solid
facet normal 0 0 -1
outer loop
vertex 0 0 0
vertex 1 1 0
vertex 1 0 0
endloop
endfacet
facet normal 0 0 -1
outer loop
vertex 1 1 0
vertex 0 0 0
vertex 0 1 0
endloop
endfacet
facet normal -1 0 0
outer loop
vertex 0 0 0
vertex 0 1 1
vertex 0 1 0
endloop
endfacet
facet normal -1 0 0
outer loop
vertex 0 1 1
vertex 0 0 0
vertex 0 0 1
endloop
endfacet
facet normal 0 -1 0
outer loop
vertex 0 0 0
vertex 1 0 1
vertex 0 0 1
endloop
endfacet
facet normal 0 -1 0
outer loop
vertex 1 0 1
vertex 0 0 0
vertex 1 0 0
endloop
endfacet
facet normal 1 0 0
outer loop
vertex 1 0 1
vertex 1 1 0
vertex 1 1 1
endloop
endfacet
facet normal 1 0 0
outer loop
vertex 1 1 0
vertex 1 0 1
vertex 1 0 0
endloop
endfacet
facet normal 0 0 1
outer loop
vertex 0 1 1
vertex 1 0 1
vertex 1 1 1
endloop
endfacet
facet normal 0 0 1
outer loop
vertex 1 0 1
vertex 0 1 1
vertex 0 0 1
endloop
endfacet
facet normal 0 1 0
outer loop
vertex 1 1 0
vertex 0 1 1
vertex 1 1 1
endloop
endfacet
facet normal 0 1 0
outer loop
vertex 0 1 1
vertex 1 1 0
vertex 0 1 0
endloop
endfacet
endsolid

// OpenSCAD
//------------------------------------------------------------------------------------------
// THIS CODE WAS GENERATED WITH GRAPHSCAD
// IF U LIKE GRAPHSCAD PLEASE DONATE//------------------------------------------------------------------------------------------
// D:/workspace/graphscad/graphscadfiles/clamp.scad
//------------------------------------------------------------------------------------------
// Graphscad is a graphical nodal editor to create .SCAD files
//
// More info here : http://graphscad.free.fr
//
// Scad Files created with Graphscad can be edited by graphscad
// Scad Files created with Graphscad can be read by Openscad
//
//------------------------------------------------------------------------------------------
$assembled=false;
$debug=false;
/*------------------- Headers --------------------------------*/
/*------------------- declared modules --------------------------------*/
/*------------------- Other Headers --------------------------------*/
/*------------------- default module --------------------------------*/
/* force parameters for default module if they are connected to declaremodule */
/* force functions for default module if they are connected to declaremodule */
module clamp()
{
 /*------------------- isolated output objects --------------------------------*/
 /*------------------- final objects output --------------------------------*/
 function node_sphere_matrix(i=0,j=0,k=0,l=0,m=0,n=0) = translate([0,0,0]);
 module node_sphere(i=0,j=0,k=0,l=0,m=0,n=0)
 {
   sphere(r=1,$fn=128);
 }
 function node_clamp_matrix(i=0,j=0,k=0,l=0,m=0,n=0) = node_sphere_matrix(i=i,j=j,k=k,l=l,m=m,n=n);
 module node_clamp(i=0,j=0,k=0,l=0,m=0,n=0)
 {
  intersection()
  {
   {
    node_sphere(i,j,k,l,m,n);
   }
   translate([0,0,0])cube([1,1,1],center=false);
  }
 }
 /*--call non input node--*/
 node_clamp();
 function node_cube_matrix(i=0,j=0,k=0,l=0,m=0,n=0) = translate([0,0,0]);
 module node_cube(i=0,j=0,k=0,l=0,m=0,n=0)
 {
  cube([1,1,1],center=false);
 }
 function node_color_matrix(i=0,j=0,k=0,l=0,m=0,n=0) = node_cube_matrix(i=i,j=j,k=k,l=l,m=m,n=n);
 module node_color(i=0,j=0,k=0,l=0,m=0,n=0)
 {
  {
   color([1,0,0,0.2])node_cube(i,j,k,l,m,n);
  }
 }
 /*--call non input node--*/
 node_color();
}
clamp();
/*--------------------------------------------------------------------------------------------------------
 Graphscad Utils functions
 This code is Used By Graphscad Nodal Editor to generate SCAD files
--------------------------------------------------------------------------------------------------------*/
function det4x4(a) =
a[0][0]*a[1][1]*a[2][2]*a[3][3] + a[0][0]*a[1][2]*a[2][3]*a[3][1] + a[0][0]*a[1][3]*a[2][1]*a[3][2]
+ a[0][1]*a[1][0]*a[2][3]*a[3][2] + a[0][1]*a[1][2]*a[2][0]*a[3][3] + a[0][1]*a[1][3]*a[2][2]*a[3][0]
+ a[0][2]*a[1][0]*a[2][1]*a[3][3] + a[0][2]*a[1][1]*a[2][3]*a[3][0] + a[0][2]*a[1][3]*a[2][0]*a[3][1]
+ a[0][3]*a[1][0]*a[2][2]*a[3][1] + a[0][3]*a[1][1]*a[2][0]*a[3][2] + a[0][3]*a[1][2]*a[2][1]*a[3][0]
- a[0][0]*a[1][1]*a[2][3]*a[3][2] - a[0][0]*a[1][2]*a[2][1]*a[3][3] - a[0][0]*a[1][3]*a[2][2]*a[3][1]
- a[0][1]*a[1][0]*a[2][2]*a[3][3] - a[0][1]*a[1][2]*a[2][3]*a[3][0] - a[0][1]*a[1][3]*a[2][0]*a[3][2]
- a[0][2]*a[1][0]*a[2][3]*a[3][1] - a[0][2]*a[1][1]*a[2][0]*a[3][3] - a[0][2]*a[1][3]*a[2][1]*a[3][0]
- a[0][3]*a[1][0]*a[2][1]*a[3][2] - a[0][3]*a[1][1]*a[2][2]*a[3][0] - a[0][3]*a[1][2]*a[2][0]*a[3][1];
function invb00(a) = a[1][1]*a[2][2]*a[3][3] + a[1][2]*a[2][3]*a[3][1] + a[1][3]*a[2][1]*a[3][2] - a[1][1]*a[2][3]*a[3][2] - a[1][2]*a[2][1]*a[3][3] - a[1][3]*a[2][2]*a[3][1];
function invb01(a) = a[0][1]*a[2][3]*a[3][2] + a[0][2]*a[2][1]*a[3][3] + a[0][3]*a[2][2]*a[3][1] - a[0][1]*a[2][2]*a[3][3] - a[0][2]*a[2][3]*a[3][1] - a[0][3]*a[2][1]*a[3][2];
function invb02(a) = a[0][1]*a[1][2]*a[3][3] + a[0][2]*a[1][3]*a[3][1] + a[0][3]*a[1][1]*a[3][2] - a[0][1]*a[1][3]*a[3][2] - a[0][2]*a[1][1]*a[3][3] - a[0][3]*a[1][2]*a[3][1];
function invb03(a) = a[0][1]*a[1][3]*a[2][2] + a[0][2]*a[1][1]*a[2][3] + a[0][3]*a[1][2]*a[2][1] - a[0][1]*a[1][2]*a[2][3] - a[0][2]*a[1][3]*a[2][1] - a[0][3]*a[1][1]*a[2][2];
function invb10(a) = a[1][0]*a[2][3]*a[3][2] + a[1][2]*a[2][0]*a[3][3] + a[1][3]*a[2][2]*a[3][0] - a[1][0]*a[2][2]*a[3][3] - a[1][2]*a[2][3]*a[3][0] - a[1][3]*a[2][0]*a[3][2];
function invb11(a) = a[0][0]*a[2][2]*a[3][3] + a[0][2]*a[2][3]*a[3][0] + a[0][3]*a[2][0]*a[3][2] - a[0][0]*a[2][3]*a[3][2] - a[0][2]*a[2][0]*a[3][3] - a[0][3]*a[2][2]*a[3][0];
function invb12(a) = a[0][0]*a[1][3]*a[3][2] + a[0][2]*a[1][0]*a[3][3] + a[0][3]*a[1][2]*a[3][0] - a[0][0]*a[1][2]*a[3][3] - a[0][2]*a[1][3]*a[3][0] - a[0][3]*a[1][0]*a[3][2];
function invb13(a) = a[0][0]*a[1][2]*a[2][3] + a[0][2]*a[1][3]*a[2][0] + a[0][3]*a[1][0]*a[2][2] - a[0][0]*a[1][3]*a[2][2] - a[0][2]*a[1][0]*a[2][3] - a[0][3]*a[1][2]*a[2][0];
function invb20(a) = a[1][0]*a[2][1]*a[3][3] + a[1][1]*a[2][3]*a[3][0] + a[1][3]*a[2][0]*a[3][1] - a[1][0]*a[2][3]*a[3][1] - a[1][1]*a[2][0]*a[3][3] - a[1][3]*a[2][1]*a[3][0];
function invb21(a) = a[0][0]*a[2][3]*a[3][1] + a[0][1]*a[2][0]*a[3][3] + a[0][3]*a[2][1]*a[3][0] - a[0][0]*a[2][1]*a[3][3] - a[0][1]*a[2][3]*a[3][0] - a[0][3]*a[2][0]*a[3][1];
function invb22(a) = a[0][0]*a[1][1]*a[3][3] + a[0][1]*a[1][3]*a[3][0] + a[0][3]*a[1][0]*a[3][1] - a[0][0]*a[1][3]*a[3][1] - a[0][1]*a[1][0]*a[3][3] - a[0][3]*a[1][1]*a[3][0];
function invb23(a) = a[0][0]*a[1][3]*a[2][1] + a[0][1]*a[1][0]*a[2][3] + a[0][3]*a[1][1]*a[2][0] - a[0][0]*a[1][1]*a[2][3] - a[0][1]*a[1][3]*a[2][0] - a[0][3]*a[1][0]*a[2][1];
function invb30(a) = a[1][0]*a[2][2]*a[3][1] + a[1][1]*a[2][0]*a[3][2] + a[1][2]*a[2][1]*a[3][0] - a[1][0]*a[2][1]*a[3][2] - a[1][1]*a[2][2]*a[3][0] - a[1][2]*a[2][0]*a[3][1];
function invb31(a) = a[0][0]*a[2][1]*a[3][2] + a[0][1]*a[2][2]*a[3][0] + a[0][2]*a[2][0]*a[3][1] - a[0][0]*a[2][2]*a[3][1] - a[0][1]*a[2][0]*a[3][2] - a[0][2]*a[2][1]*a[3][0];
function invb32(a) = a[0][0]*a[1][2]*a[3][1] + a[0][1]*a[1][0]*a[3][2] + a[0][2]*a[1][1]*a[3][0] - a[0][0]*a[1][1]*a[3][2] - a[0][1]*a[1][2]*a[3][0] - a[0][2]*a[1][0]*a[3][1];
function invb33(a) = a[0][0]*a[1][1]*a[2][2] + a[0][1]*a[1][2]*a[2][0] + a[0][2]*a[1][0]*a[2][1] - a[0][0]*a[1][2]*a[2][1] - a[0][1]*a[1][0]*a[2][2] - a[0][2]*a[1][1]*a[2][0];
function inv4x4(a)= (1/det4x4(a))*[
[invb00(a),invb01(a),invb02(a),invb03(a)],
[invb10(a),invb11(a),invb12(a),invb13(a)],
[invb20(a),invb21(a),invb22(a),invb23(a)],
[invb30(a),invb31(a),invb32(a),invb33(a)]];
function onlytranslate(a)=  [
                       [1,0,0,a[0][3]],
                       [0,1,0,a[1][3]],
                       [0,0,1,a[2][3]],
                       [0,0,0,1]];
function negonlytranslate(a)=[
                       [1,0,0,-a[0][3]],
                       [0,1,0,-a[1][3]],
                       [0,0,1,-a[2][3]],
                       [0,0,0,1]];
function lookatvec(t,parentmat) = [t[0]-parentmat[0][3],
                                t[1]-parentmat[1][3],
                                t[2]-parentmat[2][3]];
/*
             rx = '0'
             ry = 'acos('+tz+'/norm(['+tx+','+ty+','+tz+']))'
             rz = 'atan2('+ty+','+tx+')'
*/
function lookatrot(t,parentmat) = [0,
                                acos((t[2]-parentmat[2][3])/norm(lookatvec(t,parentmat))),
                                atan2(t[1]-parentmat[1][3],t[0]-parentmat[0][3])];
function gettranslation(m) = [m[0][3],m[1][3],m[2][3]];
function vectormulmatrix(v,m) = m*v;
function vectorlength(v) = norm(v);
function vectorx(v) = v[0];
function vectory(v) = v[1];
function vectorz(v) = v[2];
function vectoradd(a,b) = (a+b);
function vectorsub(a,b) = (a-b);
function vectormul(a,b) = (a*b);
function vectordiv(a,b) = (a*(1/b));
function scale(v)=[[v[0],0,0,0],
                   [0,v[1],0,0],
                   [0,0,v[2],0],
                   [0,0,0,1]];
function rotatex(a)=[[1,0,0,0],
                     [0,cos(a),-sin(a),0],
                     [0,sin(a),cos(a),0],
                     [0,0,0,1]];
function rotatey(a)=[[cos(a),0,sin(a),0],
                     [0,1,0,0],
                     [-sin(a),0,cos(a),0],
                     [0,0,0,1]];
function rotatez(a)=[[cos(a),-sin(a),0,0],
                     [sin(a),cos(a),0,0],
                     [0,0,1,0],
                     [0,0,0,1]];
function rotatea(c,s,l,m,n)=[[l*l*(1-c)+c,m*l*(1-c)-n*s,n*l*(1-c)+m*s,0],
                             [l*m*(1-c)+n*s,m*m*(1-c)+c,n*m*(1-c)-l*s,0],
                             [l*n*(1-c)-m*s,m*n*(1-c)+l*s,n*n*(1-c)+c,0],
                             [0,0,0,1]];
function rotateanv(a,nv)=rotatea(cos(a),sin(a),nv[0],nv[1],nv[2]);
function rotate(a,v, normV=true)=(v==undef)?rotatez(a[2])*rotatey(a[1])*rotatex(a[0]):
                     normV ? rotateanv(a,v/sqrt(v*v)) : rotateanv(a,v);
function translate(v)=[[1,0,0,v[0]],
                       [0,1,0,v[1]],
                       [0,0,1,v[2]],
                       [0,0,0,1]];
function mirrorabc(a,b,c)=[[1-2*a*a,-2*a*b,-2*a*c,0],
                           [-2*a*b,1-2*b*b,-2*b*c,0],
                           [-2*a*c,-2*b*c,1-2*c*c,0],
                           [0,0,0,1]];
function mirrornv(nv)=mirrorabc(nv[0],nv[1],nv[2]);
function mirror(v)=mirrornv(v/sqrt(v*v));


/*BEGINGRAPHSCAD{
    "nodes": [
        {
            "name": "node_clamp",
            "inputplugs": [
                {
                    "tip": "input 3D object to clamp",
                    "connection": "node_sphere.object",
                    "type": "object",
                    "name": "object",
                    "value": ""
                },
                {
                    "tip": "x size of clamping cube",
                    "type": "str",
                    "name": "x",
                    "value": "1"
                },
                {
                    "tip": "y size of clamping cube",
                    "type": "str",
                    "name": "y",
                    "value": "1"
                },
                {
                    "tip": "z size of clamping cube",
                    "type": "str",
                    "name": "z",
                    "value": "1"
                },
                {
                    "tip": "x translation of output object",
                    "type": "str",
                    "name": "tx",
                    "value": "0"
                },
                {
                    "tip": "y translation of output object",
                    "type": "str",
                    "name": "ty",
                    "value": "0"
                },
                {
                    "tip": "z translation of output object",
                    "type": "str",
                    "name": "tz",
                    "value": "0"
                },
                {
                    "tip": "centering of clamping cube",
                    "type": "str",
                    "name": "center",
                    "value": "false",
                    "combo": [
                        "false",
                        "true"
                    ]
                }
            ],
            "typename": "Node_clamp",
            "version": 1,
            "y": -101.40960000000001,
            "x": 173.38400000000007
        },
        {
            "name": "node_sphere",
            "inputplugs": [
                {
                    "tip": "radius of sphere",
                    "type": "str",
                    "name": "radius",
                    "value": "1"
                },
                {
                    "tip": "x translation",
                    "type": "str",
                    "name": "tx",
                    "value": "0"
                },
                {
                    "tip": "y translation",
                    "type": "str",
                    "name": "ty",
                    "value": "0"
                },
                {
                    "tip": "z translation",
                    "type": "str",
                    "name": "tz",
                    "value": "0"
                },
                {
                    "type": "str",
                    "name": "$fn",
                    "value": "128"
                }
            ],
            "typename": "Node_sphere",
            "version": 1,
            "y": -101.12831999999992,
            "x": -162.79609600000003
        },
        {
            "name": "node_cube",
            "inputplugs": [
                {
                    "tip": "x size of cube",
                    "type": "str",
                    "name": "sizex",
                    "value": "1"
                },
                {
                    "tip": "y size of cube",
                    "type": "str",
                    "name": "sizey",
                    "value": "1"
                },
                {
                    "tip": "z size of cube",
                    "type": "str",
                    "name": "sizez",
                    "value": "1"
                },
                {
                    "tip": "x translation of output object",
                    "type": "str",
                    "name": "tx",
                    "value": "0"
                },
                {
                    "tip": "y translation of output object",
                    "type": "str",
                    "name": "ty",
                    "value": "0"
                },
                {
                    "tip": "z translation of output object",
                    "type": "str",
                    "name": "tz",
                    "value": "0"
                },
                {
                    "tip": "centering of cube",
                    "type": "str",
                    "name": "center",
                    "value": "false",
                    "combo": [
                        "true",
                        "false"
                    ]
                }
            ],
            "typename": "Node_cube",
            "version": 1,
            "y": 224.04928000000004,
            "x": -161.88729599999996
        },
        {
            "name": "node_color",
            "inputplugs": [
                {
                    "tip": "input 3D object",
                    "connection": "node_cube.object",
                    "type": "object",
                    "name": "object",
                    "value": ""
                },
                {
                    "alias": "red",
                    "tip": "red  (expression or string from 0 to 1)",
                    "type": "str",
                    "name": "r",
                    "value": "1"
                },
                {
                    "alias": "green",
                    "tip": "green  (expression or string from 0 to 1)",
                    "type": "str",
                    "name": "g",
                    "value": "0"
                },
                {
                    "alias": "blue",
                    "tip": "blue  (expression or string from 0 to 1)",
                    "type": "str",
                    "name": "b",
                    "value": "0"
                },
                {
                    "alias": "alpha",
                    "tip": "alpha (expression or string from 0 to 1)",
                    "type": "str",
                    "name": "a",
                    "value": "0.2"
                }
            ],
            "typename": "Node_color",
            "version": 1,
            "y": 254.44928,
            "x": 148.03270399999997
        },
        {
            "name": "node_comment",
            "inputplugs": [
                {
                    "tip": "comment string to display on background",
                    "type": "str",
                    "name": "comment",
                    "value": "this is an example of a clamp node.\nsphere is clamped in node_clamp interval\n"
                }
            ],
            "typename": "Node_comment",
            "version": 1,
            "y": 140.54496,
            "x": -136.13183999999998
        }
    ],
    "version": 2
}ENDGRAPHSCAD*/
